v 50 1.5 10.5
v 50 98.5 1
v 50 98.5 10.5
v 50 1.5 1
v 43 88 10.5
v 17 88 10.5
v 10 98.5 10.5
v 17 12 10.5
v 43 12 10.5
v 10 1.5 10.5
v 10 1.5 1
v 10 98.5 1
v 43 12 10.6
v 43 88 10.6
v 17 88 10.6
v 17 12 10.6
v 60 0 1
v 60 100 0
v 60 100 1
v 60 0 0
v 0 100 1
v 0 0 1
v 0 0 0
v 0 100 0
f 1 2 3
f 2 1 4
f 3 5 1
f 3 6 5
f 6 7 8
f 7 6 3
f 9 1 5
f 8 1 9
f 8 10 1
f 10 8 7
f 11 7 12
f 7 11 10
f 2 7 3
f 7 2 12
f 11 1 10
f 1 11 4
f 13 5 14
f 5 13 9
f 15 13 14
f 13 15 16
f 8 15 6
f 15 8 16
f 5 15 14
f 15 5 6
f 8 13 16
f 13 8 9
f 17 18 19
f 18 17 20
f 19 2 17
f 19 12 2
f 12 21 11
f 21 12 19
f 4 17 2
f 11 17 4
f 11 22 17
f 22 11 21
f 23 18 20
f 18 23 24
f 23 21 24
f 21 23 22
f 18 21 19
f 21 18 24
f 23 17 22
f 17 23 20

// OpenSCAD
// file: config.scad
box_length = 100;
box_width = 50;
box_height = 20;

// options: builtin, addon
solder_tip_cleaner = "addon";

display_pcb_height = 60;
display_pcb_width = 100;

display_height = 40;
display_width = 97;
display_depth = 10;

power_plug_height = 47;
power_plug_width = 27;

solder_plug_pins = 8;
solder_plug_middle_pin = 1;
// main file
include <config.scad>

lcd_width = 76;
lcd_height = 26;

module display(){
    // pcb
    color("Green")cube([display_pcb_height, display_pcb_width, 1]);

    //display
    translate([(display_pcb_height - display_height)/2, (display_pcb_width- display_width)/2, 1/2]){
        color("Black") cube([display_height, display_width, display_depth]);
        color("Blue") translate([(display_height - lcd_height)/2,(display_width - lcd_width)/2,display_depth - 0.9]) cube([lcd_height, lcd_width, 1]);
    }
    
    
}

display();
